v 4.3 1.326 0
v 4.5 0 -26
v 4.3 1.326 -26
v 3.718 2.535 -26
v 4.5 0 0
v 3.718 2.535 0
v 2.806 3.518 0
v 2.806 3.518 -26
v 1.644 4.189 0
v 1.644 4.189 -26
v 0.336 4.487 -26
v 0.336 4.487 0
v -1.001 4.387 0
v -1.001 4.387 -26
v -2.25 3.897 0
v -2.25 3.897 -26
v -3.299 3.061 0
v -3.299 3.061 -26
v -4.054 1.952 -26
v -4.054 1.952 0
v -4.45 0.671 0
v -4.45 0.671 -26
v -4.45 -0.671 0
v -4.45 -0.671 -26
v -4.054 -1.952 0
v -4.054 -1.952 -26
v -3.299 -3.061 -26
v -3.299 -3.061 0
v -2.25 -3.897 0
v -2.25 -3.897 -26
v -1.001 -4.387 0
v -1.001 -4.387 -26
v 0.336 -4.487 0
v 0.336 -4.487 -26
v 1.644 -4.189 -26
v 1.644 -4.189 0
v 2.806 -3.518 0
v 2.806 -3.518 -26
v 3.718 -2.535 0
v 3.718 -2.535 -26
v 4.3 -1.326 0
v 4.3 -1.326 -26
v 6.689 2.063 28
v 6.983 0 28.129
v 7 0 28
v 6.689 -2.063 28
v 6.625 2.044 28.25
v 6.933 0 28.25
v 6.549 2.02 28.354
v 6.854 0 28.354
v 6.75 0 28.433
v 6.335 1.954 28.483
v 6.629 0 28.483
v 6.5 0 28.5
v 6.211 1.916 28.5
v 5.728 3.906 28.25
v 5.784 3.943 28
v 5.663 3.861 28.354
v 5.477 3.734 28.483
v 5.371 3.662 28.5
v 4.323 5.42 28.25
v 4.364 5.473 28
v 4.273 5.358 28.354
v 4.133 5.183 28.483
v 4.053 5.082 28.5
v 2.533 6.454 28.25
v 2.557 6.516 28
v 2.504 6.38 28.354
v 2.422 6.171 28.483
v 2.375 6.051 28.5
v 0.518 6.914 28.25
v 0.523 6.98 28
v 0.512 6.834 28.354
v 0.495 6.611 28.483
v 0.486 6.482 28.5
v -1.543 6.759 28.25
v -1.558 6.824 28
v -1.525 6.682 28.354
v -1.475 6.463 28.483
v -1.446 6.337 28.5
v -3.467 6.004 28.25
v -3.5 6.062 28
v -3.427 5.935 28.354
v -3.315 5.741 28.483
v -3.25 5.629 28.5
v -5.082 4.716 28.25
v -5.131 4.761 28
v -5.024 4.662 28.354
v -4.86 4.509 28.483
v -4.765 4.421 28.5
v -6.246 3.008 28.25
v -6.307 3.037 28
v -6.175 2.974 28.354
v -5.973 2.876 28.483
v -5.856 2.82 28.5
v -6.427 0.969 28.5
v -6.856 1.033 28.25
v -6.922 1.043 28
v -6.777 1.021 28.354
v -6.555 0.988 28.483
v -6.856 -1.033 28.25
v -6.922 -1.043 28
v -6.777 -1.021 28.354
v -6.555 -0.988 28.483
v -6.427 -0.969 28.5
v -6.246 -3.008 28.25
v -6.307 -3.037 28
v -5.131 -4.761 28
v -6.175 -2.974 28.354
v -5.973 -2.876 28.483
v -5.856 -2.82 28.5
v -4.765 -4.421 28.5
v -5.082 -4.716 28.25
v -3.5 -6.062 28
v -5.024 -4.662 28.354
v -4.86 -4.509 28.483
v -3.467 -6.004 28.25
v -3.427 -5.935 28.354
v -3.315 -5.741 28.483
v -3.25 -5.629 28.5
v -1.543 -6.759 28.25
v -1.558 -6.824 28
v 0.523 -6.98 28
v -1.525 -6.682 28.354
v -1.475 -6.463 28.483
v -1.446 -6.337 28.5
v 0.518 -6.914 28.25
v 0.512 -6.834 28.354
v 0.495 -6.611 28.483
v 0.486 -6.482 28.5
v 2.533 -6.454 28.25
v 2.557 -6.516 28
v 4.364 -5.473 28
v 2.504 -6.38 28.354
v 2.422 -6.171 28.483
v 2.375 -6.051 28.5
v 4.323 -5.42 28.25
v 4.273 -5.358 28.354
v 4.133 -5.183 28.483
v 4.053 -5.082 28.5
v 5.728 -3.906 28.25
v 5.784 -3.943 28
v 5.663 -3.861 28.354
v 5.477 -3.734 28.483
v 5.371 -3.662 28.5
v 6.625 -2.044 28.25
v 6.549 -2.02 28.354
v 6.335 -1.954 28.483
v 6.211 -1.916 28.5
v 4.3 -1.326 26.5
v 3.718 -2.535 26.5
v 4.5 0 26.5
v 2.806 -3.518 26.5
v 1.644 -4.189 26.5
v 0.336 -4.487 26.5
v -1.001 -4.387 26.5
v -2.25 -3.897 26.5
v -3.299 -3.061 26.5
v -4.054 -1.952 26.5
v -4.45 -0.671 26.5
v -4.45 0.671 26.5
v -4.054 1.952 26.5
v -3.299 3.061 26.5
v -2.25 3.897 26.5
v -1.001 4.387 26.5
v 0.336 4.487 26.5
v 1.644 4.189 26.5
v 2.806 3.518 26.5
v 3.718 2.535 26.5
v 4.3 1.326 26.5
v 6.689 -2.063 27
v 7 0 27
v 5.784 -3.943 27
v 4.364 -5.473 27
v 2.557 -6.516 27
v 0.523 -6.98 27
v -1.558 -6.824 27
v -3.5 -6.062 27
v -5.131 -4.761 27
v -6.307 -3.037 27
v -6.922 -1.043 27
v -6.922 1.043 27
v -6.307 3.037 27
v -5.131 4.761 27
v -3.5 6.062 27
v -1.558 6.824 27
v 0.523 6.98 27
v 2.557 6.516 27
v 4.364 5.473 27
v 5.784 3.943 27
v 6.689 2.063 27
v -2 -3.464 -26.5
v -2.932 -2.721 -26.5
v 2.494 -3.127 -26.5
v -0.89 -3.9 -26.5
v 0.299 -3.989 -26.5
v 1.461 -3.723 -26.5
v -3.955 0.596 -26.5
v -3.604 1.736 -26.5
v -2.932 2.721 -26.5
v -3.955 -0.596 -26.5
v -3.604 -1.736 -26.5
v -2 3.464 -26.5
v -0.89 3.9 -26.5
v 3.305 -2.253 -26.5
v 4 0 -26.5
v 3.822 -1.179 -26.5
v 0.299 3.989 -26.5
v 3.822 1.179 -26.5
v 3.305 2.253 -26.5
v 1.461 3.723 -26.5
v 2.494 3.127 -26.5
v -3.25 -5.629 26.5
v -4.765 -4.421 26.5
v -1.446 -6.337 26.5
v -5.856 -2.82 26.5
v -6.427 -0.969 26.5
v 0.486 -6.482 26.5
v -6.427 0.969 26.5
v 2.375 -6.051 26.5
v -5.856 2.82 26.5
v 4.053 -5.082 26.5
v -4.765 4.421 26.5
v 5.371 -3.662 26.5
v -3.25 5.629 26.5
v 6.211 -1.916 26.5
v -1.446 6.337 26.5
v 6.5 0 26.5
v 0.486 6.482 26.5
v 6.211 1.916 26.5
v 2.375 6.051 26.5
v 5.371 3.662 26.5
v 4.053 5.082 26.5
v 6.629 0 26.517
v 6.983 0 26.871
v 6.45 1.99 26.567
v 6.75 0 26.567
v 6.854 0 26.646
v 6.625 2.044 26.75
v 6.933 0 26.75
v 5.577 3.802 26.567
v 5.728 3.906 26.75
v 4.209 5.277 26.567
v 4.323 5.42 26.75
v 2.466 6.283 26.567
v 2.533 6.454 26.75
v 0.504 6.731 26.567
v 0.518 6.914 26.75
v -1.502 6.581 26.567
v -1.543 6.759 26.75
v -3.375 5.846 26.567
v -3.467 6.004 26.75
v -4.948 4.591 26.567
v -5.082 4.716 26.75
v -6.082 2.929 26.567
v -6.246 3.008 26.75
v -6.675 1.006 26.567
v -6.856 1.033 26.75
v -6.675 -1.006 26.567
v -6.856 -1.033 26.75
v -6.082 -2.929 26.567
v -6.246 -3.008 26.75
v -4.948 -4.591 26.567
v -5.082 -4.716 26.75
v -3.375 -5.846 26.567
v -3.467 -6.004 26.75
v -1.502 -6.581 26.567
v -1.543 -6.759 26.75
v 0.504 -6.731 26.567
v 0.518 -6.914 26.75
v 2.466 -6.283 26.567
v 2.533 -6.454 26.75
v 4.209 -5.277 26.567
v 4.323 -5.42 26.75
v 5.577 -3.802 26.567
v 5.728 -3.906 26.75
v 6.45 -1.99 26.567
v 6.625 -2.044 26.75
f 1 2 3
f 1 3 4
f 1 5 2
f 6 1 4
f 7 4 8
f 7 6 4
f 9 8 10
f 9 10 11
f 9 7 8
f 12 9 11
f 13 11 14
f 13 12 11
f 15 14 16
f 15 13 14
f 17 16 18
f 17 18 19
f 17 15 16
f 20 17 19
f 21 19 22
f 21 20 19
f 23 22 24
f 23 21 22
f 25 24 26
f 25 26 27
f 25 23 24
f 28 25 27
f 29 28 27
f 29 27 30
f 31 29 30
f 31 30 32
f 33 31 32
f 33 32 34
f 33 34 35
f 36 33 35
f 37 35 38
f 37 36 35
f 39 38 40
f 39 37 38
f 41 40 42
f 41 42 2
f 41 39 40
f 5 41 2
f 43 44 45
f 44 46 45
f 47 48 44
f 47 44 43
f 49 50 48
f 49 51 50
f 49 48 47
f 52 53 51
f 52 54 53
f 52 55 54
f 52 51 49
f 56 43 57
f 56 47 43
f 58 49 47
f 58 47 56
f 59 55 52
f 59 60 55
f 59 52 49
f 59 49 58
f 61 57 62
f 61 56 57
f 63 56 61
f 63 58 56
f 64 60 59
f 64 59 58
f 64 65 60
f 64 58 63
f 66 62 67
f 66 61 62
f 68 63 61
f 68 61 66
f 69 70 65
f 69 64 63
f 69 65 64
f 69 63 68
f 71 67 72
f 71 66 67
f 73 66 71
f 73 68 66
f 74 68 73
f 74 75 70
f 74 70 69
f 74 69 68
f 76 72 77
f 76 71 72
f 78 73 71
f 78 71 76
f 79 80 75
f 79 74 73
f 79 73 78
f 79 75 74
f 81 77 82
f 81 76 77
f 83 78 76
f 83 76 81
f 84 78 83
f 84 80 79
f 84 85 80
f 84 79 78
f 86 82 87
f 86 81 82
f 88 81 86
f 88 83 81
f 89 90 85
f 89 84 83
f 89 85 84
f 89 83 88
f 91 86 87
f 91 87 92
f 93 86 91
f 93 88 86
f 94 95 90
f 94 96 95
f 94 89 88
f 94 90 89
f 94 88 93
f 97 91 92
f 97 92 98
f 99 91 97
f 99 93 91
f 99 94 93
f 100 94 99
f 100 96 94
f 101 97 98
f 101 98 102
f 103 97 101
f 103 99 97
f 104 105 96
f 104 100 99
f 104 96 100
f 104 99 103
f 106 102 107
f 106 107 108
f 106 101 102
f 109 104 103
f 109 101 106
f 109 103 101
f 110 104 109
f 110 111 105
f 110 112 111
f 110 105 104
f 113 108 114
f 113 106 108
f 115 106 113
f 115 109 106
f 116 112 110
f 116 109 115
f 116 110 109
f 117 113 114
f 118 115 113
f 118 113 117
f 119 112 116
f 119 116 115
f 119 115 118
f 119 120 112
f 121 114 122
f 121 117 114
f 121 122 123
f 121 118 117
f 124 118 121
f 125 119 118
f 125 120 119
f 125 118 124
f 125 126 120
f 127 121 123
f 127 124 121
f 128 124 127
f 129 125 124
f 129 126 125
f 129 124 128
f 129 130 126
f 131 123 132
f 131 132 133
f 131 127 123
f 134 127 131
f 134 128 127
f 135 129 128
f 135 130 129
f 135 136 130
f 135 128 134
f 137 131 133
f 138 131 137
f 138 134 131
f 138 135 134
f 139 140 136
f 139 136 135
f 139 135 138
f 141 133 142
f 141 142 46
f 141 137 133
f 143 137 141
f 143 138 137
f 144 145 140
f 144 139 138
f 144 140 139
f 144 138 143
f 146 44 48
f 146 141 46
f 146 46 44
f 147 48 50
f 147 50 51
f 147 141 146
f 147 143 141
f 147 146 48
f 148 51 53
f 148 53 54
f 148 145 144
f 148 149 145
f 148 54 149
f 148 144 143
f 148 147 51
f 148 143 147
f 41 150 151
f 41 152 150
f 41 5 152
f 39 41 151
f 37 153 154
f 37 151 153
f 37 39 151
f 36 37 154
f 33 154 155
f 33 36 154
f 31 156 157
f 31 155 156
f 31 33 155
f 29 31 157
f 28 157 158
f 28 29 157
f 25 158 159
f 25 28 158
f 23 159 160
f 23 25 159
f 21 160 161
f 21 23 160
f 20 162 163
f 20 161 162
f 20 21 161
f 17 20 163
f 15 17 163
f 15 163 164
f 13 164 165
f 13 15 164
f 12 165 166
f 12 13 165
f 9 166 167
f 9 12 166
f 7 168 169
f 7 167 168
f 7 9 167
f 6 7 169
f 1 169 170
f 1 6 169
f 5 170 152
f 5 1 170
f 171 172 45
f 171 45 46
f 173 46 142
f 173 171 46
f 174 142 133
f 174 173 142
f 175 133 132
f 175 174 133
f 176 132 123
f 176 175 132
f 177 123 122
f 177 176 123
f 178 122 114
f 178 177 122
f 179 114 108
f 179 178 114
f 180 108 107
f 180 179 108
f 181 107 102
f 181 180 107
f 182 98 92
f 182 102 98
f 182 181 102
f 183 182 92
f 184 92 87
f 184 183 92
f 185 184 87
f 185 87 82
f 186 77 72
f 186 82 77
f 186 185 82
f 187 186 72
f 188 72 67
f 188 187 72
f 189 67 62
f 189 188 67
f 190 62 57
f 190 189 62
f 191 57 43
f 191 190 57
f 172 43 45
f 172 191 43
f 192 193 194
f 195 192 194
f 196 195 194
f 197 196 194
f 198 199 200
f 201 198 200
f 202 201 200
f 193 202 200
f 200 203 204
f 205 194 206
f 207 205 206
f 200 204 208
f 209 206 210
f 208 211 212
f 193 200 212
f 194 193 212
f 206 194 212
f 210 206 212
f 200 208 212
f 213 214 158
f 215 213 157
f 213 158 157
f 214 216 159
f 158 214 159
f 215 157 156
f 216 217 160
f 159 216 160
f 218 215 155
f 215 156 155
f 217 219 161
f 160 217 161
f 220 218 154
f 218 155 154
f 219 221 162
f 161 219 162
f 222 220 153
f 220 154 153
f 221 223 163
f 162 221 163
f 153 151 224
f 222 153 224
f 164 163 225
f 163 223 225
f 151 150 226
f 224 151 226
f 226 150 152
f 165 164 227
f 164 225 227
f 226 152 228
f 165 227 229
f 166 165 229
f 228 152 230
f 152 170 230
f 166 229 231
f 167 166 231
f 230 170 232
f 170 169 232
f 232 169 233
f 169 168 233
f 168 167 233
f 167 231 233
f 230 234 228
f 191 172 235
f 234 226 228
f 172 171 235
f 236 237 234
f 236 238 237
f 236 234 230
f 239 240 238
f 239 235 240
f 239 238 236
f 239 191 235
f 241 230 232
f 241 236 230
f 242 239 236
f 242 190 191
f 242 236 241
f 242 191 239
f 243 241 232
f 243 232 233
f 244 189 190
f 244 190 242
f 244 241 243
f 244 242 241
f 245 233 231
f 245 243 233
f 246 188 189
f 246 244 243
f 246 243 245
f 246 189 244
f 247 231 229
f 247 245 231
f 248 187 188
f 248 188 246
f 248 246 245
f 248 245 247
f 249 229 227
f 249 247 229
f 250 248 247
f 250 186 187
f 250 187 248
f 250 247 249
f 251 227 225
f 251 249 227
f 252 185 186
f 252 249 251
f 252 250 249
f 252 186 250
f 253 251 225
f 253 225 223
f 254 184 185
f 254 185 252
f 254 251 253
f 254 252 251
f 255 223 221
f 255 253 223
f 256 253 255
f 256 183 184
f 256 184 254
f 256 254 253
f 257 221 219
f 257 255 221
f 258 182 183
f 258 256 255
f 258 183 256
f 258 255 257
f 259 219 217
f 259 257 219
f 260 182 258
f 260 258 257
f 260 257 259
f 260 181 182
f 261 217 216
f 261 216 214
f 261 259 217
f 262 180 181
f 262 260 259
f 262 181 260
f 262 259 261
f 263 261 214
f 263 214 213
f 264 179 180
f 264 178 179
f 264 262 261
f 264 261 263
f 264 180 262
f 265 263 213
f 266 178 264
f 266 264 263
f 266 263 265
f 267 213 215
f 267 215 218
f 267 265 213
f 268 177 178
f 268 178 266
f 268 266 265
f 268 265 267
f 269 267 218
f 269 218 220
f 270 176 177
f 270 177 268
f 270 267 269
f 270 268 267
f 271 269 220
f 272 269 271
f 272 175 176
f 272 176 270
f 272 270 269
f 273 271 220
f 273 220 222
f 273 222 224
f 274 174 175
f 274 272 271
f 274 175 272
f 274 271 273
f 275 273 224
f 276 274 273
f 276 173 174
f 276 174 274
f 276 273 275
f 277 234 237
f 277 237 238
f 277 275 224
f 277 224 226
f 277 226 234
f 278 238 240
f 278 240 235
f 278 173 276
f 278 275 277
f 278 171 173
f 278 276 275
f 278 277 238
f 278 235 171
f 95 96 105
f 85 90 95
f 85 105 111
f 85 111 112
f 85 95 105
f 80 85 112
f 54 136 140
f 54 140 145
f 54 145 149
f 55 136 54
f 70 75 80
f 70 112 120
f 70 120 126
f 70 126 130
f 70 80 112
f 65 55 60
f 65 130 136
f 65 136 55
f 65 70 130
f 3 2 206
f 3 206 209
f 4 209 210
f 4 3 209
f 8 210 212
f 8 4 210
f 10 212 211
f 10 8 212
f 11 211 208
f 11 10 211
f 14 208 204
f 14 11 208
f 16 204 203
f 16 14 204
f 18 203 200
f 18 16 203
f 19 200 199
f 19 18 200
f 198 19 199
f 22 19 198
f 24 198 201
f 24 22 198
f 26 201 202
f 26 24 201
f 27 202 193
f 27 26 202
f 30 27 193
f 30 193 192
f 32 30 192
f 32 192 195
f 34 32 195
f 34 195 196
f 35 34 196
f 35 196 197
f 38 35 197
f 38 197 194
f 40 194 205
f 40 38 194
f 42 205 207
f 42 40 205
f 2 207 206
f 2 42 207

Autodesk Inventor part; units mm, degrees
ref_plane "YZ Plane" through (0, 0, 0) normal (1, 0, 0) x (0, 1, 0)
ref_plane "XZ Plane" through (0, 0, 0) normal (0, 1, 0) x (-1, 0, 0)
ref_plane "XY Plane" through (0, 0, 0) normal (0, 0, 1) x (1, 0, 0)
sketch "Schizzo1" plane through (0, 0, 0) normal (0, 0, 1) x (1, 0, 0)
  circle A0 centre (0, 0) radius 4.5
  dimension "d0" = 9
extrude "Estrusione1" add sketch "Schizzo1" along normal mid plane 53
sketch "Schizzo2" plane through (0, 0, 26.5) normal (0, 0, 1) x (1, 0, 0)
  circle A0 centre (0, 0) radius 4.5 projected
  circle A1 centre (0, 0) radius 7
  dimension "d3" = 14
extrude "Estrusione2" add sketch "Schizzo2" along normal blind 2 contours A0 | A1
chamfer "Smusso1" distance 0.5 angle 45 1 edges at (-4.5, 0, -26.5)
thread "Filettatura1" size "M9x1.25" class "6g" standard "ANSI Metric M Profile" length 10
fillet "Raccordo1" radius 0.5 2 edges at (-7, 0, 28.5) (-7, 0, 26.5)
properties part number "Kingpin"
